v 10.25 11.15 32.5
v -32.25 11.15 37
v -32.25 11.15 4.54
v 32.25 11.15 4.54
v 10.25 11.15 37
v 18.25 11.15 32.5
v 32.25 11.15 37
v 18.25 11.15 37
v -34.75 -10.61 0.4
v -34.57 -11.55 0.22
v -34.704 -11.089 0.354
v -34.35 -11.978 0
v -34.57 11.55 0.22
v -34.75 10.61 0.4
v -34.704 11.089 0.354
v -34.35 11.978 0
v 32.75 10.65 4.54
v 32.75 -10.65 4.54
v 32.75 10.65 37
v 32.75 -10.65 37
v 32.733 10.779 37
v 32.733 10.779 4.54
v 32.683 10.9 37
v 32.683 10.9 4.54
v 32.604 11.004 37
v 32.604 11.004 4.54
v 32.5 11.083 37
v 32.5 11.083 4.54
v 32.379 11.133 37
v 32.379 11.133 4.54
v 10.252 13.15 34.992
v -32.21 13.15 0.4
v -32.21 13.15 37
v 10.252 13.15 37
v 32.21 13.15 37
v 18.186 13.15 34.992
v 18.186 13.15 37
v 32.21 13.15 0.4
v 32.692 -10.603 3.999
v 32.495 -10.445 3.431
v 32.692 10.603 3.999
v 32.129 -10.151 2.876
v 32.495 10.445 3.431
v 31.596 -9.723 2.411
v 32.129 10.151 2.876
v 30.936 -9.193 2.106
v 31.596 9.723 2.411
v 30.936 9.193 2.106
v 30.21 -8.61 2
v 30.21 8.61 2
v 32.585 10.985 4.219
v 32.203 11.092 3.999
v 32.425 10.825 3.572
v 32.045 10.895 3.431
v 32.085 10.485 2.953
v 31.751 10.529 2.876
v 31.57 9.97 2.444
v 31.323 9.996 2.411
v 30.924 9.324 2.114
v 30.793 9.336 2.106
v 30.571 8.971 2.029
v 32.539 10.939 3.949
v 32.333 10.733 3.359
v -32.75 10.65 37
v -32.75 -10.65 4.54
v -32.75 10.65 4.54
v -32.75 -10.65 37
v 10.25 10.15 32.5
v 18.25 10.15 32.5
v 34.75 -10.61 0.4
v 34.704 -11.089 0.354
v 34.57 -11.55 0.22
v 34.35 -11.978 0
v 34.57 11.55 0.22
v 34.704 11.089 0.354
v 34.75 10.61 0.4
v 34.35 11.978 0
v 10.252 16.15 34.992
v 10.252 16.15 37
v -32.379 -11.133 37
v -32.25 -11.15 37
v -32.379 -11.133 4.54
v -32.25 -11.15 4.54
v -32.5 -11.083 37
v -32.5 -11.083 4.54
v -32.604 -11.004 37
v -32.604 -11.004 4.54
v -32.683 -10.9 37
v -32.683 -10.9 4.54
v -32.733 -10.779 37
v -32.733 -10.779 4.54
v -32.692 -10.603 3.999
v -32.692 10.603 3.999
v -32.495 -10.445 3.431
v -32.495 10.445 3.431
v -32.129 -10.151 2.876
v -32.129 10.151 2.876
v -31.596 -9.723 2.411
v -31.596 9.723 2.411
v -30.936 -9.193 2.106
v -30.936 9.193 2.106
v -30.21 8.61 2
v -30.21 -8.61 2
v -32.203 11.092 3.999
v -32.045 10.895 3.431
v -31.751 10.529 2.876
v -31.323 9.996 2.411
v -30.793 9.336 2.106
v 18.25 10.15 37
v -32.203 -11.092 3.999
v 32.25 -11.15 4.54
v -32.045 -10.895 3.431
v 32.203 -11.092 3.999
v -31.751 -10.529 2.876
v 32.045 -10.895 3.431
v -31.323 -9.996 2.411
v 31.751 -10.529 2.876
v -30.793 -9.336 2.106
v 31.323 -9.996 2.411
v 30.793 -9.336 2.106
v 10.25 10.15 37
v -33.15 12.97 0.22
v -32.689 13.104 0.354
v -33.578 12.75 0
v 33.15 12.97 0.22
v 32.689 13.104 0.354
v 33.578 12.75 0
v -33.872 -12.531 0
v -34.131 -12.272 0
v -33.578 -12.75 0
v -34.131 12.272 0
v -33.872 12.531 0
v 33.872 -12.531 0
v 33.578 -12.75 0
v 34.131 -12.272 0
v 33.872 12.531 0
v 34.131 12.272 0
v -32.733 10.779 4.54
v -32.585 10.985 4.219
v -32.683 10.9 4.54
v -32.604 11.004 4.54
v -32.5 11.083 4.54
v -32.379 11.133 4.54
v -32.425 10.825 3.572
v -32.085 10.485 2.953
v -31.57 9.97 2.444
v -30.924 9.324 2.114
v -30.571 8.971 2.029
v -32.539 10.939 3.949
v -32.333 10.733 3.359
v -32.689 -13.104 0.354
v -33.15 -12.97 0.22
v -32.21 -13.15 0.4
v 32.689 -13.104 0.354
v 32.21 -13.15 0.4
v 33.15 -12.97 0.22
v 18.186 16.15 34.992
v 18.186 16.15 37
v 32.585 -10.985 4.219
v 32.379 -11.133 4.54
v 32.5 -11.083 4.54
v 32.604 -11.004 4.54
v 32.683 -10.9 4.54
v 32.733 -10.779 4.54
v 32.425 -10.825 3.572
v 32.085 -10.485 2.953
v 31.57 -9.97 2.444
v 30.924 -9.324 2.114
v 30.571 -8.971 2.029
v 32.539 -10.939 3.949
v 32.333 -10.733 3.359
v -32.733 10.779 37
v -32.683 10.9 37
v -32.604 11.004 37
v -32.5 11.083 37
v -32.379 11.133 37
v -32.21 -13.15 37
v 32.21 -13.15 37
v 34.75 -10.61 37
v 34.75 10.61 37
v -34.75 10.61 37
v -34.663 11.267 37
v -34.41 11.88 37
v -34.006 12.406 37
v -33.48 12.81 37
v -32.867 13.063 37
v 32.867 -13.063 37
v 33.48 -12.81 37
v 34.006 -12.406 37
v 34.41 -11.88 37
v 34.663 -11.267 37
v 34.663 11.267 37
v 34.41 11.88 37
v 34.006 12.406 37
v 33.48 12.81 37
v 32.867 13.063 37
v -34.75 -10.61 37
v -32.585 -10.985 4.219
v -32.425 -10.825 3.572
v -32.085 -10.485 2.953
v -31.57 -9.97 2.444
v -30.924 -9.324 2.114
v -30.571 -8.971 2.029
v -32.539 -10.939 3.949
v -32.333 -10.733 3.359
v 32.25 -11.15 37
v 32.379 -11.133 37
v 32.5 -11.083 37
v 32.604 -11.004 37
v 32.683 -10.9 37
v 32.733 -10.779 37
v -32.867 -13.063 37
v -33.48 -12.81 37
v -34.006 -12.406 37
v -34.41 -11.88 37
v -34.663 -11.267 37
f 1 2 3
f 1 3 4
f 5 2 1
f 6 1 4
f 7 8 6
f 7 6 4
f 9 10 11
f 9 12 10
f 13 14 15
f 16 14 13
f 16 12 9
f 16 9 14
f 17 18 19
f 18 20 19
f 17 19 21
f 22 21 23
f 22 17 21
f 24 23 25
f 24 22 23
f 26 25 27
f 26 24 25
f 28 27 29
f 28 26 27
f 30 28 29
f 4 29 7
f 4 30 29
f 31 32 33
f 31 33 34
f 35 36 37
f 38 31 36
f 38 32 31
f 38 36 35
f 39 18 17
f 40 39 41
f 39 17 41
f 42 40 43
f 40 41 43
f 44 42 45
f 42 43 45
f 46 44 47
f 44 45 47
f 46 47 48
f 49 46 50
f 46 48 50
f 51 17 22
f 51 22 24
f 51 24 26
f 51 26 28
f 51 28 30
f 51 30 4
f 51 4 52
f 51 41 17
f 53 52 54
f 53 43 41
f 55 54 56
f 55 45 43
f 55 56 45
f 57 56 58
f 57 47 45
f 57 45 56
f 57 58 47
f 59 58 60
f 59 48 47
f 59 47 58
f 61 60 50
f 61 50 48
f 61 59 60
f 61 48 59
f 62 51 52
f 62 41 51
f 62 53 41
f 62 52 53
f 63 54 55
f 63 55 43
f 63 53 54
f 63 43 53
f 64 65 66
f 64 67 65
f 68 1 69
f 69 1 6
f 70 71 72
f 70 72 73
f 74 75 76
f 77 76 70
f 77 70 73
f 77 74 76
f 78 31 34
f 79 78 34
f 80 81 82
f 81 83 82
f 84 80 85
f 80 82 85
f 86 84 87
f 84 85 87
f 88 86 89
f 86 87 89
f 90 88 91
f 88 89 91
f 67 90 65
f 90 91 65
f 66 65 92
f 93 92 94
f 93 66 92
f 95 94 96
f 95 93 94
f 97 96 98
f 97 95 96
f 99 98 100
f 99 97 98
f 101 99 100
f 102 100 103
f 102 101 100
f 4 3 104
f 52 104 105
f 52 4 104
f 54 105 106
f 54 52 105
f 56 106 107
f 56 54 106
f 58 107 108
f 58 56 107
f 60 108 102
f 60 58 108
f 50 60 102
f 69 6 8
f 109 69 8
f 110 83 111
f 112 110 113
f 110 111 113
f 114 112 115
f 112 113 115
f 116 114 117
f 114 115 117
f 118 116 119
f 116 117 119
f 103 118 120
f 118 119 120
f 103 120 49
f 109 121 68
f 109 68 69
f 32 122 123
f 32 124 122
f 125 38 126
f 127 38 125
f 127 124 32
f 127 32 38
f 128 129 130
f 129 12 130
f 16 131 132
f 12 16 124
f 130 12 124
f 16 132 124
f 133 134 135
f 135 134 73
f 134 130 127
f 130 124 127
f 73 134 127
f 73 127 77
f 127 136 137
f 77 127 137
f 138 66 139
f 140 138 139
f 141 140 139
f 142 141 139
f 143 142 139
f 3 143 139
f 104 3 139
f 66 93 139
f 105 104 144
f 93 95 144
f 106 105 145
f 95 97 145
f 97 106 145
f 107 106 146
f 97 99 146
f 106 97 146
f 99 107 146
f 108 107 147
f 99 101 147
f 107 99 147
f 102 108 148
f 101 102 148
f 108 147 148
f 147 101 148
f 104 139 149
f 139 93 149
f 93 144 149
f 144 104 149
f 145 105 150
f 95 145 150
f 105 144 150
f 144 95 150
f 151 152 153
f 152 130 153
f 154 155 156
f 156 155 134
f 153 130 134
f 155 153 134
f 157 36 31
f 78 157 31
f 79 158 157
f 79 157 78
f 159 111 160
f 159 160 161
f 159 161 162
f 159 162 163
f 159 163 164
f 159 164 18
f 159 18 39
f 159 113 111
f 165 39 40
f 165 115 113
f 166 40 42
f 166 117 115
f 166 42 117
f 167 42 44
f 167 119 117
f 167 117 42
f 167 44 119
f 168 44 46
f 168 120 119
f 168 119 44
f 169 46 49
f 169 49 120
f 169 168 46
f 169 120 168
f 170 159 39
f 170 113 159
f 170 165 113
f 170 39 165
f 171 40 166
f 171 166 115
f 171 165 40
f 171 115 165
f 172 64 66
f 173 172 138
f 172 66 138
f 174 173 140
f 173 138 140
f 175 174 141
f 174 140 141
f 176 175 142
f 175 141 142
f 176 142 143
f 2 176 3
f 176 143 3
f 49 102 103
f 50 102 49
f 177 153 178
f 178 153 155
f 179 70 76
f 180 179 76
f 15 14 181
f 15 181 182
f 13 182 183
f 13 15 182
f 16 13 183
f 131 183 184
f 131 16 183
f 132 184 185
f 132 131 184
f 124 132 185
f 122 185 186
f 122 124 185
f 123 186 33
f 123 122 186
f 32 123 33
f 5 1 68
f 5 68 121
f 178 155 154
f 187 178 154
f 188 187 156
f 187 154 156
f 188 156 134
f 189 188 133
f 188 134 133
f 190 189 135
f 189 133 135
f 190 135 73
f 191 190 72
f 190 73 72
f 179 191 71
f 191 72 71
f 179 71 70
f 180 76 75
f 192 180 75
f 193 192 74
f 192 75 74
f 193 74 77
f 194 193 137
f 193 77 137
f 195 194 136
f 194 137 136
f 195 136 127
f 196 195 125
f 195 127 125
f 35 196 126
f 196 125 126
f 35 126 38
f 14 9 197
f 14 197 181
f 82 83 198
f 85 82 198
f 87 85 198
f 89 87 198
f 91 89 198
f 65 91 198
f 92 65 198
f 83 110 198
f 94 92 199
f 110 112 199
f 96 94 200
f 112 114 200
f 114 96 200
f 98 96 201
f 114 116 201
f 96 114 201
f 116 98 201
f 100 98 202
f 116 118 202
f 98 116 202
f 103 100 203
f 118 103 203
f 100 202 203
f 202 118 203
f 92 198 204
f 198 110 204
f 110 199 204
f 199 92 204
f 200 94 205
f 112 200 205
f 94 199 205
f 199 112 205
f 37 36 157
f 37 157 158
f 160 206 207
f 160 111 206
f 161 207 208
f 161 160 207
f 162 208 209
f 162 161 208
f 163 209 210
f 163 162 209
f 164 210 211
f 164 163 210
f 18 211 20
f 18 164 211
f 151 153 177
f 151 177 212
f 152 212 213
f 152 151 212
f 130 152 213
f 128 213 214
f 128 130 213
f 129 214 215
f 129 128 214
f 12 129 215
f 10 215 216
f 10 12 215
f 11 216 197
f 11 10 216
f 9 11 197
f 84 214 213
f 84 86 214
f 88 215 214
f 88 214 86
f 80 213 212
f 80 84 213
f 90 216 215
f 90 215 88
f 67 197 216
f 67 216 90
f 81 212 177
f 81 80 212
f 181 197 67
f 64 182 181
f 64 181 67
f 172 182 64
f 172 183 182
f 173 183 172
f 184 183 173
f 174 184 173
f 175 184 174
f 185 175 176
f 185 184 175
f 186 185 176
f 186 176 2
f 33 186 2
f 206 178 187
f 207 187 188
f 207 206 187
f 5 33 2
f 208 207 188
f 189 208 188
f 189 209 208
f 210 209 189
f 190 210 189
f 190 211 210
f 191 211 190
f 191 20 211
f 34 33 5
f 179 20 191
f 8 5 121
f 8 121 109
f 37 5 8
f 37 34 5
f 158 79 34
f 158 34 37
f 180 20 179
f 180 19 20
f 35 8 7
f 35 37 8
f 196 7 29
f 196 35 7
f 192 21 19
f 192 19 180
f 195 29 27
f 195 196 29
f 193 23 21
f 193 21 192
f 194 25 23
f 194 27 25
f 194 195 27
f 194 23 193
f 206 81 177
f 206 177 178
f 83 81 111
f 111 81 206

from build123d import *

# Parameters (mm, degrees)
F0_W        = 69.5
F0_H        = 26.3
F1_DEPTH    = 37
F2_W        = 65.5
F2_H        = 22.3
F3_DEPTH    = 35
F4_SIZE     = 0.4
F5_T1_DEPTH = 49.3
F6_R        = 2.54
F7_W        = 8
F7_H        = 4.5
F8_DEPTH    = 1
F9_W        = 7.9342592508
F9_H        = 2.0083109736
F10_DEPTH   = 3
F11_R       = 0.5


# Not quite as in the source:
# - a fillet or chamfer that OpenCascade refuses, or shapes differently, is made with other operations: its cross-section is extruded or revolved along the edge and cut away or added


with BuildPart() as f1:
    # F0 (on Top) → F1 (new body)
    with BuildSketch(Plane.XY):
        Rectangle(F0_W, F0_H)
    extrude(amount=F1_DEPTH)

    # F2 (on face) → F3 (cut)
    with BuildSketch(Plane.XY.offset(37)):
        Rectangle(F2_W, F2_H)
    extrude(amount=-F3_DEPTH, mode=Mode.SUBTRACT)

    # F4
    f4_edges = [f1.edges().sort_by_distance(p)[0] for p in [
        (0, -13.15, 0),
        (34.75, 0, 0),
        (0, 13.15, 0),
        (-34.75, 0, 0),
    ]]
    chamfer(f4_edges, length=F4_SIZE)

    # F5: fillet of radius 2.54 on 4 edges, made by hand

    # F5_s2 → F5_t1 (cut)
    with BuildSketch(Plane.XY.offset(-5.95)):
        with BuildLine():
            ThreePointArc((34.75, 10.61), (34.0060512242, 12.4060512242), (32.21, 13.15))
            Line((32.21, 13.15), (34.75, 13.15))
            Line((34.75, 13.15), (34.75, 10.61))
        make_face()
        with BuildLine():
            ThreePointArc((32.21, -13.15), (34.0060512242, -12.4060512242), (34.75, -10.61))
            Line((34.75, -10.61), (34.75, -13.15))
            Line((34.75, -13.15), (32.21, -13.15))
        make_face()
        with BuildLine():
            ThreePointArc((-34.75, 10.61), (-34.0060512242, 12.4060512242), (-32.21, 13.15))
            Line((-32.21, 13.15), (-34.75, 13.15))
            Line((-34.75, 13.15), (-34.75, 10.61))
        make_face()
        with BuildLine():
            ThreePointArc((-32.21, -13.15), (-34.0060512242, -12.4060512242), (-34.75, -10.61))
            Line((-34.75, -10.61), (-34.75, -13.15))
            Line((-34.75, -13.15), (-32.21, -13.15))
        make_face()
    extrude(amount=F5_T1_DEPTH, mode=Mode.SUBTRACT)

    # F6
    f6_edges = [f1.edges().sort_by_distance(p)[0] for p in [
        (0, -11.15, 2),
        (-32.75, 0, 2),
        (32.75, 0, 2),
        (0, 11.15, 2),
    ]]
    fillet(f6_edges, radius=F6_R)

    # F7 (on face) → F8 (join)
    with BuildSketch(Plane.XZ.offset(-11.15)):
        with Locations((14.25, 34.75)):
            Rectangle(F7_W, F7_H)
    extrude(amount=F8_DEPTH)

    # F9 (on face) → F10 (join)
    with BuildSketch(Plane(origin=(0, 13.15, 0), x_dir=(-1, 0, 0), z_dir=(0, 1, 0))):
        with Locations((-14.2189497128, 35.9958445132)):
            Rectangle(F9_W, F9_H)
    extrude(amount=F10_DEPTH)

    # F11
    f11_edges = [f1.edges().sort_by_distance(p)[0] for p in [
        (32.75, 11.15, 20.77),
        (32.75, -11.15, 20.77),
        (-32.75, -11.15, 20.77),
        (-32.75, 11.15, 20.77),
    ]]
    fillet(f11_edges, radius=F11_R)


solid = f1.part
